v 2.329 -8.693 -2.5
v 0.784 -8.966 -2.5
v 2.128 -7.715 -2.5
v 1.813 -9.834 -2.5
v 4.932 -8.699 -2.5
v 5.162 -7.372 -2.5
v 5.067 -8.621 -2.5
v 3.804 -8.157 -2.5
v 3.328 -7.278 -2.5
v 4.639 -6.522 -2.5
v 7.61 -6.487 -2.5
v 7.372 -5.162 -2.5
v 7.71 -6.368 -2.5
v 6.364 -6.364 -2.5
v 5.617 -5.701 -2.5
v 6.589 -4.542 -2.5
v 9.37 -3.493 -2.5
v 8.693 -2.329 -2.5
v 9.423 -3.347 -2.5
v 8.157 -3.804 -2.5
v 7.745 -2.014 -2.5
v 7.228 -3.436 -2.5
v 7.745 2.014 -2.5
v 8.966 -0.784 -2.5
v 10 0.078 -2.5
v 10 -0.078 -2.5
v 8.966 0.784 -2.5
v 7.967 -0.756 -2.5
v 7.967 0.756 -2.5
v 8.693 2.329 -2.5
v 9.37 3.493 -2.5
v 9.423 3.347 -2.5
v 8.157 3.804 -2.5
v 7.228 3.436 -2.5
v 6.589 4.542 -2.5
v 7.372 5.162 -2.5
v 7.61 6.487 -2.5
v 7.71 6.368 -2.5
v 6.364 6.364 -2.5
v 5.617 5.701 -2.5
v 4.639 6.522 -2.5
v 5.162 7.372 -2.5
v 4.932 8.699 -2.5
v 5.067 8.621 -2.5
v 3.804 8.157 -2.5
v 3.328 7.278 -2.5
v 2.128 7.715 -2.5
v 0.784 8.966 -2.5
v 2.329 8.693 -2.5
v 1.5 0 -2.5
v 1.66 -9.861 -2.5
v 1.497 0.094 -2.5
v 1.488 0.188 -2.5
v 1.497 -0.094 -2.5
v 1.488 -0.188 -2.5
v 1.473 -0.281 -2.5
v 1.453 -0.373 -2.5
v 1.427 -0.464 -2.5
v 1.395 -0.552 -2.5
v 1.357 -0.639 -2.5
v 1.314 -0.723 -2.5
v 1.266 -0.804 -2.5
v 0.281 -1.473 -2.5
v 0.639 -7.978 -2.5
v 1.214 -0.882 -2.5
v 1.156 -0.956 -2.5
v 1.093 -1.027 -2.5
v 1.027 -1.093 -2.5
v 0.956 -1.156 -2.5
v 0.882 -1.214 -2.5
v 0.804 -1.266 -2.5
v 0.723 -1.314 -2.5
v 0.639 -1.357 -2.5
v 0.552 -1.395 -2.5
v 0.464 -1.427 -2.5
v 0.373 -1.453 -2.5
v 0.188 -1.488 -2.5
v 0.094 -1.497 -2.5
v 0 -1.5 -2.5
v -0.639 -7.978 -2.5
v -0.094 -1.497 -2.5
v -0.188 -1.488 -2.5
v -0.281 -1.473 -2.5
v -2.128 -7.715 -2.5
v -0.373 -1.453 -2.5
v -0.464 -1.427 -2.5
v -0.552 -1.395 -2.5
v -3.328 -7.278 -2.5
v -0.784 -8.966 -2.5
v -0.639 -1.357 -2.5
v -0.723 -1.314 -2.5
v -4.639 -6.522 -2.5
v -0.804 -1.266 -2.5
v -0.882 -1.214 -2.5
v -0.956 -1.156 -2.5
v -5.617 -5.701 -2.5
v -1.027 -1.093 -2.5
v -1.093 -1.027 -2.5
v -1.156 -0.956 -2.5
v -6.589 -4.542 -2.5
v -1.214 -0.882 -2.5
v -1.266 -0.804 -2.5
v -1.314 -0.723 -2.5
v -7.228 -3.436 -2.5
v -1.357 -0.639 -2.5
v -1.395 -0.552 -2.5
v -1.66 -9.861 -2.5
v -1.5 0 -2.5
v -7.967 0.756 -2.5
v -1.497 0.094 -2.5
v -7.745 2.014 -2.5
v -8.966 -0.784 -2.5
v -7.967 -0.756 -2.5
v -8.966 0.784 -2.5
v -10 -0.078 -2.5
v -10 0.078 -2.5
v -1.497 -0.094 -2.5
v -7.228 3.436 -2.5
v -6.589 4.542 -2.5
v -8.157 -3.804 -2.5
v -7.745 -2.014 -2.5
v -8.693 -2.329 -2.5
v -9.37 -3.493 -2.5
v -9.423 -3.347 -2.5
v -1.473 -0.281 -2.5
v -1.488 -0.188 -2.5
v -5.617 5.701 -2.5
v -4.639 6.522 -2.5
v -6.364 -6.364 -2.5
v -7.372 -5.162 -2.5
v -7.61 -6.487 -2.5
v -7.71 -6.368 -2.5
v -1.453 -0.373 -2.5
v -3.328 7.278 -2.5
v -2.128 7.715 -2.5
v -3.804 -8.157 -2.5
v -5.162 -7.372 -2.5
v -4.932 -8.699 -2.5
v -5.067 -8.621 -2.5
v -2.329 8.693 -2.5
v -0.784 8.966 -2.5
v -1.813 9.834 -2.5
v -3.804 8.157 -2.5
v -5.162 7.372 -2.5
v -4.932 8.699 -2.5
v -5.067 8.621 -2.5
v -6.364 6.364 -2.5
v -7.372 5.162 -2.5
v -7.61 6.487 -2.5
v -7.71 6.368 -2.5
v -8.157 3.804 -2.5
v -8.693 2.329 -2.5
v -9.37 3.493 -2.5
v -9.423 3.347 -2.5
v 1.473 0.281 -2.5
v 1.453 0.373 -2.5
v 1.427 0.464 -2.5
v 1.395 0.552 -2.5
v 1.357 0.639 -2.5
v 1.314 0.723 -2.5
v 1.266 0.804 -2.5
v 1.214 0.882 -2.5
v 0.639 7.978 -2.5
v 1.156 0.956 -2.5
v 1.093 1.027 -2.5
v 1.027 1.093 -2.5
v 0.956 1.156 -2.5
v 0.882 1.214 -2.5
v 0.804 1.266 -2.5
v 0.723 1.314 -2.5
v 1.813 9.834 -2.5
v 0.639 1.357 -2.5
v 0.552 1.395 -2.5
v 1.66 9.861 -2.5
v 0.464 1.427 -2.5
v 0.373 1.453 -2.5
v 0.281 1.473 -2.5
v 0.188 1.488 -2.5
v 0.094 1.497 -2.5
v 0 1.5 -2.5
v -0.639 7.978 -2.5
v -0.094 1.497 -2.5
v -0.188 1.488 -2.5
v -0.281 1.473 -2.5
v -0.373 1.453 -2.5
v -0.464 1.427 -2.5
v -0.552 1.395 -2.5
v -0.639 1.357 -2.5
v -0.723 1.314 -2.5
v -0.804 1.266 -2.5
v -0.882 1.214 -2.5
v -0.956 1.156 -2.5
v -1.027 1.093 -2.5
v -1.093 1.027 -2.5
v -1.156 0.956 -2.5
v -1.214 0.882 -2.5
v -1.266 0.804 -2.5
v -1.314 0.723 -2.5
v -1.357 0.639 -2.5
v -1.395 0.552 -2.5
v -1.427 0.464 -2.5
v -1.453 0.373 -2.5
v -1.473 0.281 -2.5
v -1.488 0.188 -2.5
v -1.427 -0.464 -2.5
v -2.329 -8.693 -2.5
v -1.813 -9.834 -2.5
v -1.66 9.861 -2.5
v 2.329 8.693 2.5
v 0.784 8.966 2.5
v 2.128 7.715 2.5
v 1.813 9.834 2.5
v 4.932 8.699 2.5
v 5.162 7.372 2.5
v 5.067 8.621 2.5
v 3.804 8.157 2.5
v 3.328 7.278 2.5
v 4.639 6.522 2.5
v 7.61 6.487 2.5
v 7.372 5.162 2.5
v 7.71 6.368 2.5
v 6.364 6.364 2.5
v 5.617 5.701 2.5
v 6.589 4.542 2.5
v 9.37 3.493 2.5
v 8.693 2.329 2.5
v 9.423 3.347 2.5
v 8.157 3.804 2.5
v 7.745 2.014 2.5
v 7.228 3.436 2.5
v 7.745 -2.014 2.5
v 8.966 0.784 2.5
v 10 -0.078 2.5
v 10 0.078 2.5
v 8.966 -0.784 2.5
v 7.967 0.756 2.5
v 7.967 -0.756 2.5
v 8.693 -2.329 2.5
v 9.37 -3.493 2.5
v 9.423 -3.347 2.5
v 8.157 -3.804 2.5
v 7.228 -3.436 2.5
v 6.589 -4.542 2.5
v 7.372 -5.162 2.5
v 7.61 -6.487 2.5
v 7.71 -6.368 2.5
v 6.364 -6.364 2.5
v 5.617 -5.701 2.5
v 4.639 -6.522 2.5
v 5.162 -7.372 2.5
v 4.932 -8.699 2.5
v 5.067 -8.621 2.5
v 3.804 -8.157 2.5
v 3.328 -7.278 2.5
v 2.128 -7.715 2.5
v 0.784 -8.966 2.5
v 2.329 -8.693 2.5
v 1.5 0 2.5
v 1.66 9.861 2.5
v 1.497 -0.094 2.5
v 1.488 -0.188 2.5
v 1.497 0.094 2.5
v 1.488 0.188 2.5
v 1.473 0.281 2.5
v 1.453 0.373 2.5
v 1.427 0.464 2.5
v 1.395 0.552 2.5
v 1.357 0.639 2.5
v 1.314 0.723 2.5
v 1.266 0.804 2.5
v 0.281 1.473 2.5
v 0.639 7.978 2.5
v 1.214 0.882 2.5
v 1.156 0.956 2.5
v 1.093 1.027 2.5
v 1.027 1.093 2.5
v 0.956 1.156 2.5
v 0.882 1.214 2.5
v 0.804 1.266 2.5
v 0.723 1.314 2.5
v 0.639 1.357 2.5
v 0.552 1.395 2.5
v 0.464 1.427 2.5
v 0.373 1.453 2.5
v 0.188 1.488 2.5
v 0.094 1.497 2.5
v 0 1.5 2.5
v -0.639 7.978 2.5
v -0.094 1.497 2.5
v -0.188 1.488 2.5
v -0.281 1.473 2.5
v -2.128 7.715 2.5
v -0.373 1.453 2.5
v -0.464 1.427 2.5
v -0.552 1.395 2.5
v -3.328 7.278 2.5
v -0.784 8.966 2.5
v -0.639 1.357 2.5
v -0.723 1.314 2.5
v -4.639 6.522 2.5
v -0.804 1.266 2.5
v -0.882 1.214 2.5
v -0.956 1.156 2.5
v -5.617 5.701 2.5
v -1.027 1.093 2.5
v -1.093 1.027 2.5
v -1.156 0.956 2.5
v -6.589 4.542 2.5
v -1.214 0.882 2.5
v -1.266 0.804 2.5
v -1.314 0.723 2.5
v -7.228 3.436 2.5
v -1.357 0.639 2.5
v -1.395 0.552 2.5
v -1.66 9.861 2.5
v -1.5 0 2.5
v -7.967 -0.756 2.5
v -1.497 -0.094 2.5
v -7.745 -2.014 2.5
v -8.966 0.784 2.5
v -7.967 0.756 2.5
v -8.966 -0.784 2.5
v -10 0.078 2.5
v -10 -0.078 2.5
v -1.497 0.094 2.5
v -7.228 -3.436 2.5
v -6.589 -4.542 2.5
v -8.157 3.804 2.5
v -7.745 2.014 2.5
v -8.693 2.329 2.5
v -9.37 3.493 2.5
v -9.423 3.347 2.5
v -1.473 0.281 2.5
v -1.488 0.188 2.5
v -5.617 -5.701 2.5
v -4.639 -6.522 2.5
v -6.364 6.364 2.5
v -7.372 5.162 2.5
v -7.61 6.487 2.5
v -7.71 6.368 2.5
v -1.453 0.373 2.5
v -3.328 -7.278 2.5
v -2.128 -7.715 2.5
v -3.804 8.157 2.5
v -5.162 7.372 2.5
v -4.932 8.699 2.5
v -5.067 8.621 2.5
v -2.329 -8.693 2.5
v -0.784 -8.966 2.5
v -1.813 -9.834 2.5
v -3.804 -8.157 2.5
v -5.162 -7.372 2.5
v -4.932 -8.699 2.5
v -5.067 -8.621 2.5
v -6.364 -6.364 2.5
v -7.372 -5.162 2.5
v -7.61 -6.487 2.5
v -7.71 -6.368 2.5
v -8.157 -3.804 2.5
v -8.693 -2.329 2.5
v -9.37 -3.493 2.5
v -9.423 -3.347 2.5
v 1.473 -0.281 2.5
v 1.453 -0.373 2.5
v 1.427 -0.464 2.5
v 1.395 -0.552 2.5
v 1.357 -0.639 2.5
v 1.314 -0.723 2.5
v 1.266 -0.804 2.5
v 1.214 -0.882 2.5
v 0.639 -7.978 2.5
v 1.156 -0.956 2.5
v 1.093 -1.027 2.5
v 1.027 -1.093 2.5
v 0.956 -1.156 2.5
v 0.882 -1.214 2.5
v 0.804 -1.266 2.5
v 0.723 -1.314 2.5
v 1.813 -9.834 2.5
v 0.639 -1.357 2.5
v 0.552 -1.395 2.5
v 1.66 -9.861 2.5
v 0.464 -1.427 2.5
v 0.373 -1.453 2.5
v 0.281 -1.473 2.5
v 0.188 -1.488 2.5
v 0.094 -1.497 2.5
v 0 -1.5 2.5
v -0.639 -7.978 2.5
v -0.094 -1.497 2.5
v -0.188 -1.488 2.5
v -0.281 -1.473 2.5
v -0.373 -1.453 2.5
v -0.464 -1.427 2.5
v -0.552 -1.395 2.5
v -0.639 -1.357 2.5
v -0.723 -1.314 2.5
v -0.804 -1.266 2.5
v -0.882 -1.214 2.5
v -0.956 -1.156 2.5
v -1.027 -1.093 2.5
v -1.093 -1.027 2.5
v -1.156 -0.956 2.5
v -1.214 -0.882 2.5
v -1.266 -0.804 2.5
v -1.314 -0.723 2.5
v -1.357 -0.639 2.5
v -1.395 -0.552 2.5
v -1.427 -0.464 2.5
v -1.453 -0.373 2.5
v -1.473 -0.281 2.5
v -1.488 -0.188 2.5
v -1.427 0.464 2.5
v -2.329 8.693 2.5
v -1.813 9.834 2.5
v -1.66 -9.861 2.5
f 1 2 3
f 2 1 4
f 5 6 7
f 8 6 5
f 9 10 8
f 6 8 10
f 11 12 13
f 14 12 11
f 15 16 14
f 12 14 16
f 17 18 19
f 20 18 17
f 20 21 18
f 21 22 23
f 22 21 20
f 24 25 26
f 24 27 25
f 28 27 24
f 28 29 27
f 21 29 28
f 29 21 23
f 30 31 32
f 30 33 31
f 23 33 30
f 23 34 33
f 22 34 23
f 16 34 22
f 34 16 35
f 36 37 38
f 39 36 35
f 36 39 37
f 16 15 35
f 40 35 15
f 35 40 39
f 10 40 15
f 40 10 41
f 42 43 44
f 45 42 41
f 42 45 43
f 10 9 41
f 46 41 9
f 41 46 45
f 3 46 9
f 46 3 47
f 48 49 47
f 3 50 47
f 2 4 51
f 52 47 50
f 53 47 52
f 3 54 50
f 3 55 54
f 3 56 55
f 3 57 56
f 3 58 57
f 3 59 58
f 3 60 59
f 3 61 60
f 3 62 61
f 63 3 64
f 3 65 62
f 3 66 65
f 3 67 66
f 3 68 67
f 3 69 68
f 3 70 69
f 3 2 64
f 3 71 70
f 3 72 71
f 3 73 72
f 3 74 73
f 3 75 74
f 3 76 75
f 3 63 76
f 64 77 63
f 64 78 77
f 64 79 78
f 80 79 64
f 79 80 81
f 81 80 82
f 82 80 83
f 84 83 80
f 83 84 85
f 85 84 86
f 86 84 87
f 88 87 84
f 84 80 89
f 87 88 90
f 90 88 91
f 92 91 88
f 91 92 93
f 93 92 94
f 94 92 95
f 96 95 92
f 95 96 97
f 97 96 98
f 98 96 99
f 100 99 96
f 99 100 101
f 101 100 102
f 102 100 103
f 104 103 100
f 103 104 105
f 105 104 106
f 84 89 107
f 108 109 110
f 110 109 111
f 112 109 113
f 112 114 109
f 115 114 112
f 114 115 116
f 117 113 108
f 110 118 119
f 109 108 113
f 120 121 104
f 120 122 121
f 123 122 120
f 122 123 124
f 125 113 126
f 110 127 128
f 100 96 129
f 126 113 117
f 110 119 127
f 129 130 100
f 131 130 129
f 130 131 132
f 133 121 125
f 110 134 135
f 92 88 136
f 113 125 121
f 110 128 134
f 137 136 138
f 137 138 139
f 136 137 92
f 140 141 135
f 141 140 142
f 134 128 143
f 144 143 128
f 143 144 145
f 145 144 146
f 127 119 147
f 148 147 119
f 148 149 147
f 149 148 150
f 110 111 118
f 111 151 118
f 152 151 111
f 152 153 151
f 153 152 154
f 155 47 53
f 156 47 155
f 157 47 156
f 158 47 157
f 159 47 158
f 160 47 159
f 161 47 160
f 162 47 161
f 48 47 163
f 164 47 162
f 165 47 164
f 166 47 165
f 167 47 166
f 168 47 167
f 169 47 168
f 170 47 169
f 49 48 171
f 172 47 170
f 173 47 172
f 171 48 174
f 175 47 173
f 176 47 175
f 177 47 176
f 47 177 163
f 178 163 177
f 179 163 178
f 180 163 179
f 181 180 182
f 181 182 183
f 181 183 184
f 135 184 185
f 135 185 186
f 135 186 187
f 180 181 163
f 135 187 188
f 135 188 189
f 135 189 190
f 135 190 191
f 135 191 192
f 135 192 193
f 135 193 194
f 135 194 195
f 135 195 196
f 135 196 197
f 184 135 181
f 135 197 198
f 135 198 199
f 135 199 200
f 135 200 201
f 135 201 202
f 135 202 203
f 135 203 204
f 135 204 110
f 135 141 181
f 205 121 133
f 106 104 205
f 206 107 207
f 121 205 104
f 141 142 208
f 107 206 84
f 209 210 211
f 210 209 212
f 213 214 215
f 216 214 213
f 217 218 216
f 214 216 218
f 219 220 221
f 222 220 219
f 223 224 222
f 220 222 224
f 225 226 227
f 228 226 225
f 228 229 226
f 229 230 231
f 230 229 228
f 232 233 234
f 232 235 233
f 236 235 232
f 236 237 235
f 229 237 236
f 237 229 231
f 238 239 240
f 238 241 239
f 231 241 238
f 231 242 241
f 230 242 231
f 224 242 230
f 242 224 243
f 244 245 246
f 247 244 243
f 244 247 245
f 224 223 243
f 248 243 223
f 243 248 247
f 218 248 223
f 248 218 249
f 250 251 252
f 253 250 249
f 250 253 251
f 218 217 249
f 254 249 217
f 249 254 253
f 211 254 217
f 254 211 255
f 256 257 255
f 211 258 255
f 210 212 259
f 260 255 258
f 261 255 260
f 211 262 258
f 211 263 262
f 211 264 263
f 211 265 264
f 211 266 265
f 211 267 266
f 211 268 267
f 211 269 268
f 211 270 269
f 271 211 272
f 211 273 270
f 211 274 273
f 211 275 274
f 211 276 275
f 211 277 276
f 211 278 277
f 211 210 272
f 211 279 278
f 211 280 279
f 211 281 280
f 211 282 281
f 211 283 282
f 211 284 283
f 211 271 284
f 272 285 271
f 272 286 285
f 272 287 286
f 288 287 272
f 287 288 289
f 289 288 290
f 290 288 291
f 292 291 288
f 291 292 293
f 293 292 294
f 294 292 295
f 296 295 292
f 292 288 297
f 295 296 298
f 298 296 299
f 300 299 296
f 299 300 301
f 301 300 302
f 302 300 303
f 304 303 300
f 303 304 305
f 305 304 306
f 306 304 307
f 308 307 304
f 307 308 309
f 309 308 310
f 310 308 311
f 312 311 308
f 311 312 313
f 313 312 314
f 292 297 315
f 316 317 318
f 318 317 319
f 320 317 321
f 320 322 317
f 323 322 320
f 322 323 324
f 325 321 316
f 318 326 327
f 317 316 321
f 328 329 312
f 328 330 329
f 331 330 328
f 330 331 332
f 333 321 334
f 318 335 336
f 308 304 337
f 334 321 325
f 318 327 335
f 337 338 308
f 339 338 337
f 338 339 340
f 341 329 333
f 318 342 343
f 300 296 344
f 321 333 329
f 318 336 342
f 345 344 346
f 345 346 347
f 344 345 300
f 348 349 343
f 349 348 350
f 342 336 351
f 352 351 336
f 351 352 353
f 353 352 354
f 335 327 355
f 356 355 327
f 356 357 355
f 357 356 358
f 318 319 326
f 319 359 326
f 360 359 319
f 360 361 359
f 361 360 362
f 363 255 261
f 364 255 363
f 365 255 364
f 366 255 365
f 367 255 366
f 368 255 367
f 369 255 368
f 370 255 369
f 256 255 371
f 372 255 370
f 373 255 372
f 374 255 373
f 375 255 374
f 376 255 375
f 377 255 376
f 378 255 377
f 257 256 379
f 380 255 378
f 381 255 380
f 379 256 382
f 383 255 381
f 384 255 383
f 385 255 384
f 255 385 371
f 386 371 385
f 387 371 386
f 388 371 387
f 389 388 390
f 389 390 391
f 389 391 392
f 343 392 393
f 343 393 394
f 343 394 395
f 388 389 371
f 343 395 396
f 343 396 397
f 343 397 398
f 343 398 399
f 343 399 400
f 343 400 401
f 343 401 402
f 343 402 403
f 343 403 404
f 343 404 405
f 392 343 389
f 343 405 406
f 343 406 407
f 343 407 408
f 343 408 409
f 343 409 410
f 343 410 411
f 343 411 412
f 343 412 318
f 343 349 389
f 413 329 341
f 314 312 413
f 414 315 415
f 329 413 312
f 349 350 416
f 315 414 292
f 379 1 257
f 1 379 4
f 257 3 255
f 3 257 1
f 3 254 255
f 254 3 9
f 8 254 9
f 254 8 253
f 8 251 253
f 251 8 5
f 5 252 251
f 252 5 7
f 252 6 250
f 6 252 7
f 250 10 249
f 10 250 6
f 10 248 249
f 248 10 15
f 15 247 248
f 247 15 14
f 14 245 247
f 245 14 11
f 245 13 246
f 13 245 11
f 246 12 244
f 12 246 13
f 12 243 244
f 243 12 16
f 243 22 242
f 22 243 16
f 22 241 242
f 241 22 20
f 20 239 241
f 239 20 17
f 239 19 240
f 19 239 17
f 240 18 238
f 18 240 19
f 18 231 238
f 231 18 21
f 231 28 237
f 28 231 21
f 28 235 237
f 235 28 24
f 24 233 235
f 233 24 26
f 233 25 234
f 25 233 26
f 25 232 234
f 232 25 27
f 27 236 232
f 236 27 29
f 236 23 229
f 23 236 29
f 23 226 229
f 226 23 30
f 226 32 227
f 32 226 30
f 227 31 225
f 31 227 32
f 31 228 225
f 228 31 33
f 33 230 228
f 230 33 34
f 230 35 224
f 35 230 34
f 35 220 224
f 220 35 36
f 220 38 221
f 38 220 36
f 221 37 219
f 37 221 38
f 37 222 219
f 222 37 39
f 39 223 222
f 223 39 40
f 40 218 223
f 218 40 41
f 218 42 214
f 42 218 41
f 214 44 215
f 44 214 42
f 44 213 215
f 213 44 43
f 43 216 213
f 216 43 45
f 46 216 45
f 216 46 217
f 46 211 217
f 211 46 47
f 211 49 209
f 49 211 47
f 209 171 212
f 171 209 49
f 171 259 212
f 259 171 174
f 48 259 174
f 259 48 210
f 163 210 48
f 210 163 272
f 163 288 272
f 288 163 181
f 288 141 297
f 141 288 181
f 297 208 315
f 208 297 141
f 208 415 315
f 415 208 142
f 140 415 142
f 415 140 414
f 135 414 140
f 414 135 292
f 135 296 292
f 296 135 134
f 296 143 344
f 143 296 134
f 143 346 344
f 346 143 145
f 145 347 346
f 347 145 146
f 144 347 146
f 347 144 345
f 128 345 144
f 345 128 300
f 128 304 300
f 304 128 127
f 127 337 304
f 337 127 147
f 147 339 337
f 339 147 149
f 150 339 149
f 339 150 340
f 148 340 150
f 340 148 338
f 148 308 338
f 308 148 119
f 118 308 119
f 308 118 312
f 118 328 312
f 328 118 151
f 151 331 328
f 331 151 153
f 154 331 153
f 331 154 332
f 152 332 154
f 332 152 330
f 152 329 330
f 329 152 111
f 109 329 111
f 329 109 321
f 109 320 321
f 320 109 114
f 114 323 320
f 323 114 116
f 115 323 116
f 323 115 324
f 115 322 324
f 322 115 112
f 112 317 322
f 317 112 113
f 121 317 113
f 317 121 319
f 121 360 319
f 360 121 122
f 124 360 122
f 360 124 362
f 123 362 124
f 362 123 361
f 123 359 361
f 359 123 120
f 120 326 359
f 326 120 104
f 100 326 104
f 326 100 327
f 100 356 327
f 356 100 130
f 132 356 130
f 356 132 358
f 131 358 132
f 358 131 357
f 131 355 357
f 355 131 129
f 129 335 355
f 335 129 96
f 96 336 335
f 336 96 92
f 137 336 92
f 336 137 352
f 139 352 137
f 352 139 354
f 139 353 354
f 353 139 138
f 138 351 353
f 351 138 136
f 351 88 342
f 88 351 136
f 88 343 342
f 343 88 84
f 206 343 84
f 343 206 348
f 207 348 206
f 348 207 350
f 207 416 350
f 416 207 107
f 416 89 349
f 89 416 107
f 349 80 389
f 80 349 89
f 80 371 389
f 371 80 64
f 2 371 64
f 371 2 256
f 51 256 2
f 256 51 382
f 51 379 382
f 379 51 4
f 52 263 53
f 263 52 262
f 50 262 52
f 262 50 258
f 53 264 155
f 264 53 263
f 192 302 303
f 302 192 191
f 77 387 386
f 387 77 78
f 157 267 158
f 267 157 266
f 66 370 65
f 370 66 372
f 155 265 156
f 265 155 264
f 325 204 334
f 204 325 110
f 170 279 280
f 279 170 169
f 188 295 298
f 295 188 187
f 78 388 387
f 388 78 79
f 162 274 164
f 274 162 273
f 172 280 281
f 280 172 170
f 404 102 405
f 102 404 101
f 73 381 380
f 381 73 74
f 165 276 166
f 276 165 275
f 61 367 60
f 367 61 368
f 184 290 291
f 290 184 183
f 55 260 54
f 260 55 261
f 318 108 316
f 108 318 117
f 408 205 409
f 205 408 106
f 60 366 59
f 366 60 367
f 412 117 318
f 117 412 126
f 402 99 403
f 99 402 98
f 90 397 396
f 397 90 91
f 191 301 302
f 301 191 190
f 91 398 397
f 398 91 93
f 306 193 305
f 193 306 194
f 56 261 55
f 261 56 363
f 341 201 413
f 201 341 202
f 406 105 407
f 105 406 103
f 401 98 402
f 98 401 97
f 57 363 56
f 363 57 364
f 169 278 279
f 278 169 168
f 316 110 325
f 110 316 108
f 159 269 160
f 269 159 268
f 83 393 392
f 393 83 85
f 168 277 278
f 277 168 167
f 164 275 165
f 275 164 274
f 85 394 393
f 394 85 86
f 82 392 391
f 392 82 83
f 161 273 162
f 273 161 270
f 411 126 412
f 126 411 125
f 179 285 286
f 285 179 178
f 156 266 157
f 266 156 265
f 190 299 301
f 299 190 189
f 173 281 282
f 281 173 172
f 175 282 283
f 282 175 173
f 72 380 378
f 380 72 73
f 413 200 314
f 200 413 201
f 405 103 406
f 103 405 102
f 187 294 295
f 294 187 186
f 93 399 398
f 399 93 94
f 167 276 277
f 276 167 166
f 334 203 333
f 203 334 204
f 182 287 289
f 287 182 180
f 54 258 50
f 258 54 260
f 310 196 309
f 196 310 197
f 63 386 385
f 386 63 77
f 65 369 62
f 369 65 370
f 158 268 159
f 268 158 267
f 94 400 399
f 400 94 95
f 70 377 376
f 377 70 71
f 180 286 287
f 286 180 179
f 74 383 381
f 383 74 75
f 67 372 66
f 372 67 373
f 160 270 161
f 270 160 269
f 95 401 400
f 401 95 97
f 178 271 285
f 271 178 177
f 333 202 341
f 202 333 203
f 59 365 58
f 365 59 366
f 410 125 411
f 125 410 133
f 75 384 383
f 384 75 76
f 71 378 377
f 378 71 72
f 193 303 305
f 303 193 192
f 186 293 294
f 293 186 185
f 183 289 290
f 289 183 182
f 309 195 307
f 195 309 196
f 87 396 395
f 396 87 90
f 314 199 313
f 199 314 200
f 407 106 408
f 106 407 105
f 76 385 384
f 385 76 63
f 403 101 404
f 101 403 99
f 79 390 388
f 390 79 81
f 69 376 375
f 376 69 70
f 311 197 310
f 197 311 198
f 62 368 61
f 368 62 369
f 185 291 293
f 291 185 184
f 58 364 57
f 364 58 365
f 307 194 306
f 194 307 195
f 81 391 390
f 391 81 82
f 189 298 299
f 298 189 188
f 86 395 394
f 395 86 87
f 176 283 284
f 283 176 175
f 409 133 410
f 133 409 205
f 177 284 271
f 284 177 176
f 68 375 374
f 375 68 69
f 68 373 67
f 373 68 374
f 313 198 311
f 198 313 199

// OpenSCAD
height = 5;
type = "Spur"; // [Spur,Cog,Double Helix, Single Helix]
teeth = 18;	//	[18:50]

hole = "Yes"; //[Yes,No]
rotate_Offset_double_Helix_only = 5; //[0:20]

holeSize = 1.5;//don't make too big or your gear will disappear
scale = 100;//this is here temperarily I would not reccomend changing!


if (type == "Spur")
{
if(hole == "Yes")
{
hole();
}
else
{
spur();
}
}
else if(type == "Cog")
{
if(hole == "Yes")
{
hole();
}
else
{
cog();
}
}
else if(type == "Double Helix")
{

if(hole == "Yes")
{
hole();
}
else
{
double_helix();
}
}
else if (type == "Single Helix")
{
if(hole == "Yes")
{
hole();
}
else
{
single_helix();
}
}


module gear(number_of_teeth,
		circular_pitch=false, diametral_pitch=false,
		pressure_angle=20, clearance = 0)
{

	//Convert diametrial pitch to our native circular pitch
	circular_pitch = (circular_pitch!=false?circular_pitch:180/diametral_pitch);

	// Pitch diameter: Diameter of pitch circle.
	pitch_diameter  =  number_of_teeth * circular_pitch / 180;
	pitch_radius = pitch_diameter/2;

	// Base Circle
	base_diameter = pitch_diameter*cos(pressure_angle);
	base_radius = base_diameter/2;

	// Diametrial pitch: Number of teeth per unit length.
	pitch_diametrial = number_of_teeth / pitch_diameter;

	// Addendum: Radial distance from pitch circle to outside circle.
	addendum = 1/pitch_diametrial;

	//Outer Circle
	outer_radius = pitch_radius+addendum;
	outer_diameter = outer_radius*2;

	// Dedendum: Radial distance from pitch circle to root diameter
	dedendum = addendum + clearance;

	// Root diameter: Diameter of bottom of tooth spaces.
	root_radius = pitch_radius-dedendum;
	root_diameter = root_radius * 2;

	half_thick_angle = 360 / (4 * number_of_teeth);

	union()
	{
		rotate(half_thick_angle) circle($fn=number_of_teeth*2, r=root_radius*1.001);

		for (i= [1:number_of_teeth])
		//for (i = [0])
		{
			rotate([0,0,i*360/number_of_teeth])
			{
				involute_gear_tooth(
					pitch_radius = pitch_radius,
					root_radius = root_radius,
					base_radius = base_radius-6,
					outer_radius = outer_radius,
					half_thick_angle = half_thick_angle);
			}
		}
	}
}


module involute_gear_tooth(
					pitch_radius,
					root_radius,
					base_radius,
					outer_radius,
					half_thick_angle
					)
{
	pitch_to_base_angle  = involute_intersect_angle( base_radius, pitch_radius );

	outer_to_base_angle = involute_intersect_angle( base_radius/2, outer_radius*1);

	base1 = 0 - pitch_to_base_angle - half_thick_angle;
	pitch1 = 0 - half_thick_angle;
	outer1 = outer_to_base_angle - pitch_to_base_angle - half_thick_angle;

	b1 = polar_to_cartesian([ base1, base_radius ]);
	p1 = polar_to_cartesian([ pitch1, pitch_radius ]);
	o1 = polar_to_cartesian([ outer1, outer_radius ]);

	b2 = polar_to_cartesian([ -base1, base_radius ]);
	p2 = polar_to_cartesian([ -pitch1, pitch_radius ]);
	o2 = polar_to_cartesian([ -outer1, outer_radius ]);

	// ( root_radius > base_radius variables )
		pitch_to_root_angle = pitch_to_base_angle - involute_intersect_angle(base_radius, root_radius );
		root1 = pitch1 - pitch_to_root_angle;
		root2 = -pitch1 + pitch_to_root_angle;
		r1_t =  polar_to_cartesian([ root1, root_radius ]);
		r2_t =  polar_to_cartesian([ -root1, root_radius ]);

	// ( else )
		r1_f =  polar_to_cartesian([ base1, root_radius ]);
		r2_f =  polar_to_cartesian([ -base1, root_radius ]);

	if (root_radius > base_radius)
	{
		//echo("true");
		polygon( points = [
			r1_t,p1,o1,o2,p2,r2_t
		], convexity = 3);
	}
	else
	{
		polygon( points = [
			r1_f, b1,p1,o1,o2,p2,b2,r2_f
		], convexity = 3);
	}

}

// Mathematical Functions
//===============

// Finds the angle of the involute about the base radius at the given distance (radius) from it's center.
//source: http://www.mathhelpforum.com/math-help/geometry/136011-circle-involute-solving-y-any-given-x.html

function involute_intersect_angle(base_radius, radius) = sqrt( pow(radius/base_radius,2) - 1);



// Polar coord [angle, radius] to cartesian coord [x,y]

function polar_to_cartesian(polar) = [
	polar[1]*cos(polar[0]),
	polar[1]*sin(polar[0])
];


// Test Cases
//===============

module test_gears()
{
	gear(number_of_teeth=51,circular_pitch=200);
	translate([0, 50])gear(number_of_teeth=17,circular_pitch=200);
	translate([-50,0]) gear(number_of_teeth=17,diametral_pitch=1);
}
module cog()
{
		gear(number_of_teeth=teeth,diametral_pitch=scale/100);

}
module single_helix()
{
	translate([50,0]);
	{
	linear_extrude(height = height, center = true, convexity = 10, twist = -45)
	 gear(number_of_teeth=teeth,diametral_pitch=scale/100);
	}
}
module double_helix()
{



linear_extrude(height = height, center = true, convexity = 10, twist = -45)
	 gear(number_of_teeth=teeth,diametral_pitch=scale/100);
	translate([0,0,height])
	rotate([0,0,rotate_Offset_double_Helix_only])
 linear_extrude(height = height, center = true, convexity = 10, twist = 45)
	 gear(number_of_teeth=teeth,diametral_pitch=scale/100);

}
module spur()
{

		translate([0,0]) linear_extrude(height = height, center = true, convexity = 10, twist = 0)
	 gear(number_of_teeth=teeth,diametral_pitch=1);


}

module demo_3d_gears()
{
	//double helical gear
	// (helics don't line up perfectly - for display purposes only ;)
	translate([50,0])
	{
	linear_extrude(height = 10, center = true, convexity = 10, twist = -45)
	 gear(number_of_teeth=17,diametral_pitch=1);
	translate([0,0,10]) linear_extrude(height = height, center = true, convexity = 10, twist = 45)
	 gear(number_of_teeth=17,diametral_pitch=1);
	}

	//spur gear
	translate([0,-50]) linear_extrude(height = height, center = true, convexity = 10, twist = 0)
	 gear(number_of_teeth=17,diametral_pitch=1);

}
module hole() {
   difference() {
if(type == "Spur")
{
translate([0,0]) linear_extrude(height = height, center = true, convexity = 10, twist = 0)
	 gear(number_of_teeth=teeth,diametral_pitch=1);
}
else if(type == "Cog")
{
gear(number_of_teeth=teeth,diametral_pitch=scale/100);
}
else if (type == "Double Helix")
{
linear_extrude(height = height, center = true, convexity = 10, twist = -45)
	 gear(number_of_teeth=teeth,diametral_pitch=scale/100);
	translate([0,0,height])
	rotate([0,0,rotate_Offset_double_Helix_only])
 linear_extrude(height = height, center = true, convexity = 10, twist = 45)
	 gear(number_of_teeth=teeth,diametral_pitch=scale/100);

}
else if (type == "Single Helix")
{
linear_extrude(height = height, center = true, convexity = 10, twist = -45)
	 gear(number_of_teeth=teeth,diametral_pitch=scale/100);
}
# rotate ([0,0,0]) cylinder (h = height*4, r=holeSize, center = true, $fn=100);
}
}




module test_involute_curve()
{
	for (i=[0,1,2,3,4,5,6,7,8,9,10,11,12,13,14,15])
	{
		translate(polar_to_cartesian([involute_intersect_angle( 0.1,i) , i ])) circle($fn=15, r=0.5);
	}
}
